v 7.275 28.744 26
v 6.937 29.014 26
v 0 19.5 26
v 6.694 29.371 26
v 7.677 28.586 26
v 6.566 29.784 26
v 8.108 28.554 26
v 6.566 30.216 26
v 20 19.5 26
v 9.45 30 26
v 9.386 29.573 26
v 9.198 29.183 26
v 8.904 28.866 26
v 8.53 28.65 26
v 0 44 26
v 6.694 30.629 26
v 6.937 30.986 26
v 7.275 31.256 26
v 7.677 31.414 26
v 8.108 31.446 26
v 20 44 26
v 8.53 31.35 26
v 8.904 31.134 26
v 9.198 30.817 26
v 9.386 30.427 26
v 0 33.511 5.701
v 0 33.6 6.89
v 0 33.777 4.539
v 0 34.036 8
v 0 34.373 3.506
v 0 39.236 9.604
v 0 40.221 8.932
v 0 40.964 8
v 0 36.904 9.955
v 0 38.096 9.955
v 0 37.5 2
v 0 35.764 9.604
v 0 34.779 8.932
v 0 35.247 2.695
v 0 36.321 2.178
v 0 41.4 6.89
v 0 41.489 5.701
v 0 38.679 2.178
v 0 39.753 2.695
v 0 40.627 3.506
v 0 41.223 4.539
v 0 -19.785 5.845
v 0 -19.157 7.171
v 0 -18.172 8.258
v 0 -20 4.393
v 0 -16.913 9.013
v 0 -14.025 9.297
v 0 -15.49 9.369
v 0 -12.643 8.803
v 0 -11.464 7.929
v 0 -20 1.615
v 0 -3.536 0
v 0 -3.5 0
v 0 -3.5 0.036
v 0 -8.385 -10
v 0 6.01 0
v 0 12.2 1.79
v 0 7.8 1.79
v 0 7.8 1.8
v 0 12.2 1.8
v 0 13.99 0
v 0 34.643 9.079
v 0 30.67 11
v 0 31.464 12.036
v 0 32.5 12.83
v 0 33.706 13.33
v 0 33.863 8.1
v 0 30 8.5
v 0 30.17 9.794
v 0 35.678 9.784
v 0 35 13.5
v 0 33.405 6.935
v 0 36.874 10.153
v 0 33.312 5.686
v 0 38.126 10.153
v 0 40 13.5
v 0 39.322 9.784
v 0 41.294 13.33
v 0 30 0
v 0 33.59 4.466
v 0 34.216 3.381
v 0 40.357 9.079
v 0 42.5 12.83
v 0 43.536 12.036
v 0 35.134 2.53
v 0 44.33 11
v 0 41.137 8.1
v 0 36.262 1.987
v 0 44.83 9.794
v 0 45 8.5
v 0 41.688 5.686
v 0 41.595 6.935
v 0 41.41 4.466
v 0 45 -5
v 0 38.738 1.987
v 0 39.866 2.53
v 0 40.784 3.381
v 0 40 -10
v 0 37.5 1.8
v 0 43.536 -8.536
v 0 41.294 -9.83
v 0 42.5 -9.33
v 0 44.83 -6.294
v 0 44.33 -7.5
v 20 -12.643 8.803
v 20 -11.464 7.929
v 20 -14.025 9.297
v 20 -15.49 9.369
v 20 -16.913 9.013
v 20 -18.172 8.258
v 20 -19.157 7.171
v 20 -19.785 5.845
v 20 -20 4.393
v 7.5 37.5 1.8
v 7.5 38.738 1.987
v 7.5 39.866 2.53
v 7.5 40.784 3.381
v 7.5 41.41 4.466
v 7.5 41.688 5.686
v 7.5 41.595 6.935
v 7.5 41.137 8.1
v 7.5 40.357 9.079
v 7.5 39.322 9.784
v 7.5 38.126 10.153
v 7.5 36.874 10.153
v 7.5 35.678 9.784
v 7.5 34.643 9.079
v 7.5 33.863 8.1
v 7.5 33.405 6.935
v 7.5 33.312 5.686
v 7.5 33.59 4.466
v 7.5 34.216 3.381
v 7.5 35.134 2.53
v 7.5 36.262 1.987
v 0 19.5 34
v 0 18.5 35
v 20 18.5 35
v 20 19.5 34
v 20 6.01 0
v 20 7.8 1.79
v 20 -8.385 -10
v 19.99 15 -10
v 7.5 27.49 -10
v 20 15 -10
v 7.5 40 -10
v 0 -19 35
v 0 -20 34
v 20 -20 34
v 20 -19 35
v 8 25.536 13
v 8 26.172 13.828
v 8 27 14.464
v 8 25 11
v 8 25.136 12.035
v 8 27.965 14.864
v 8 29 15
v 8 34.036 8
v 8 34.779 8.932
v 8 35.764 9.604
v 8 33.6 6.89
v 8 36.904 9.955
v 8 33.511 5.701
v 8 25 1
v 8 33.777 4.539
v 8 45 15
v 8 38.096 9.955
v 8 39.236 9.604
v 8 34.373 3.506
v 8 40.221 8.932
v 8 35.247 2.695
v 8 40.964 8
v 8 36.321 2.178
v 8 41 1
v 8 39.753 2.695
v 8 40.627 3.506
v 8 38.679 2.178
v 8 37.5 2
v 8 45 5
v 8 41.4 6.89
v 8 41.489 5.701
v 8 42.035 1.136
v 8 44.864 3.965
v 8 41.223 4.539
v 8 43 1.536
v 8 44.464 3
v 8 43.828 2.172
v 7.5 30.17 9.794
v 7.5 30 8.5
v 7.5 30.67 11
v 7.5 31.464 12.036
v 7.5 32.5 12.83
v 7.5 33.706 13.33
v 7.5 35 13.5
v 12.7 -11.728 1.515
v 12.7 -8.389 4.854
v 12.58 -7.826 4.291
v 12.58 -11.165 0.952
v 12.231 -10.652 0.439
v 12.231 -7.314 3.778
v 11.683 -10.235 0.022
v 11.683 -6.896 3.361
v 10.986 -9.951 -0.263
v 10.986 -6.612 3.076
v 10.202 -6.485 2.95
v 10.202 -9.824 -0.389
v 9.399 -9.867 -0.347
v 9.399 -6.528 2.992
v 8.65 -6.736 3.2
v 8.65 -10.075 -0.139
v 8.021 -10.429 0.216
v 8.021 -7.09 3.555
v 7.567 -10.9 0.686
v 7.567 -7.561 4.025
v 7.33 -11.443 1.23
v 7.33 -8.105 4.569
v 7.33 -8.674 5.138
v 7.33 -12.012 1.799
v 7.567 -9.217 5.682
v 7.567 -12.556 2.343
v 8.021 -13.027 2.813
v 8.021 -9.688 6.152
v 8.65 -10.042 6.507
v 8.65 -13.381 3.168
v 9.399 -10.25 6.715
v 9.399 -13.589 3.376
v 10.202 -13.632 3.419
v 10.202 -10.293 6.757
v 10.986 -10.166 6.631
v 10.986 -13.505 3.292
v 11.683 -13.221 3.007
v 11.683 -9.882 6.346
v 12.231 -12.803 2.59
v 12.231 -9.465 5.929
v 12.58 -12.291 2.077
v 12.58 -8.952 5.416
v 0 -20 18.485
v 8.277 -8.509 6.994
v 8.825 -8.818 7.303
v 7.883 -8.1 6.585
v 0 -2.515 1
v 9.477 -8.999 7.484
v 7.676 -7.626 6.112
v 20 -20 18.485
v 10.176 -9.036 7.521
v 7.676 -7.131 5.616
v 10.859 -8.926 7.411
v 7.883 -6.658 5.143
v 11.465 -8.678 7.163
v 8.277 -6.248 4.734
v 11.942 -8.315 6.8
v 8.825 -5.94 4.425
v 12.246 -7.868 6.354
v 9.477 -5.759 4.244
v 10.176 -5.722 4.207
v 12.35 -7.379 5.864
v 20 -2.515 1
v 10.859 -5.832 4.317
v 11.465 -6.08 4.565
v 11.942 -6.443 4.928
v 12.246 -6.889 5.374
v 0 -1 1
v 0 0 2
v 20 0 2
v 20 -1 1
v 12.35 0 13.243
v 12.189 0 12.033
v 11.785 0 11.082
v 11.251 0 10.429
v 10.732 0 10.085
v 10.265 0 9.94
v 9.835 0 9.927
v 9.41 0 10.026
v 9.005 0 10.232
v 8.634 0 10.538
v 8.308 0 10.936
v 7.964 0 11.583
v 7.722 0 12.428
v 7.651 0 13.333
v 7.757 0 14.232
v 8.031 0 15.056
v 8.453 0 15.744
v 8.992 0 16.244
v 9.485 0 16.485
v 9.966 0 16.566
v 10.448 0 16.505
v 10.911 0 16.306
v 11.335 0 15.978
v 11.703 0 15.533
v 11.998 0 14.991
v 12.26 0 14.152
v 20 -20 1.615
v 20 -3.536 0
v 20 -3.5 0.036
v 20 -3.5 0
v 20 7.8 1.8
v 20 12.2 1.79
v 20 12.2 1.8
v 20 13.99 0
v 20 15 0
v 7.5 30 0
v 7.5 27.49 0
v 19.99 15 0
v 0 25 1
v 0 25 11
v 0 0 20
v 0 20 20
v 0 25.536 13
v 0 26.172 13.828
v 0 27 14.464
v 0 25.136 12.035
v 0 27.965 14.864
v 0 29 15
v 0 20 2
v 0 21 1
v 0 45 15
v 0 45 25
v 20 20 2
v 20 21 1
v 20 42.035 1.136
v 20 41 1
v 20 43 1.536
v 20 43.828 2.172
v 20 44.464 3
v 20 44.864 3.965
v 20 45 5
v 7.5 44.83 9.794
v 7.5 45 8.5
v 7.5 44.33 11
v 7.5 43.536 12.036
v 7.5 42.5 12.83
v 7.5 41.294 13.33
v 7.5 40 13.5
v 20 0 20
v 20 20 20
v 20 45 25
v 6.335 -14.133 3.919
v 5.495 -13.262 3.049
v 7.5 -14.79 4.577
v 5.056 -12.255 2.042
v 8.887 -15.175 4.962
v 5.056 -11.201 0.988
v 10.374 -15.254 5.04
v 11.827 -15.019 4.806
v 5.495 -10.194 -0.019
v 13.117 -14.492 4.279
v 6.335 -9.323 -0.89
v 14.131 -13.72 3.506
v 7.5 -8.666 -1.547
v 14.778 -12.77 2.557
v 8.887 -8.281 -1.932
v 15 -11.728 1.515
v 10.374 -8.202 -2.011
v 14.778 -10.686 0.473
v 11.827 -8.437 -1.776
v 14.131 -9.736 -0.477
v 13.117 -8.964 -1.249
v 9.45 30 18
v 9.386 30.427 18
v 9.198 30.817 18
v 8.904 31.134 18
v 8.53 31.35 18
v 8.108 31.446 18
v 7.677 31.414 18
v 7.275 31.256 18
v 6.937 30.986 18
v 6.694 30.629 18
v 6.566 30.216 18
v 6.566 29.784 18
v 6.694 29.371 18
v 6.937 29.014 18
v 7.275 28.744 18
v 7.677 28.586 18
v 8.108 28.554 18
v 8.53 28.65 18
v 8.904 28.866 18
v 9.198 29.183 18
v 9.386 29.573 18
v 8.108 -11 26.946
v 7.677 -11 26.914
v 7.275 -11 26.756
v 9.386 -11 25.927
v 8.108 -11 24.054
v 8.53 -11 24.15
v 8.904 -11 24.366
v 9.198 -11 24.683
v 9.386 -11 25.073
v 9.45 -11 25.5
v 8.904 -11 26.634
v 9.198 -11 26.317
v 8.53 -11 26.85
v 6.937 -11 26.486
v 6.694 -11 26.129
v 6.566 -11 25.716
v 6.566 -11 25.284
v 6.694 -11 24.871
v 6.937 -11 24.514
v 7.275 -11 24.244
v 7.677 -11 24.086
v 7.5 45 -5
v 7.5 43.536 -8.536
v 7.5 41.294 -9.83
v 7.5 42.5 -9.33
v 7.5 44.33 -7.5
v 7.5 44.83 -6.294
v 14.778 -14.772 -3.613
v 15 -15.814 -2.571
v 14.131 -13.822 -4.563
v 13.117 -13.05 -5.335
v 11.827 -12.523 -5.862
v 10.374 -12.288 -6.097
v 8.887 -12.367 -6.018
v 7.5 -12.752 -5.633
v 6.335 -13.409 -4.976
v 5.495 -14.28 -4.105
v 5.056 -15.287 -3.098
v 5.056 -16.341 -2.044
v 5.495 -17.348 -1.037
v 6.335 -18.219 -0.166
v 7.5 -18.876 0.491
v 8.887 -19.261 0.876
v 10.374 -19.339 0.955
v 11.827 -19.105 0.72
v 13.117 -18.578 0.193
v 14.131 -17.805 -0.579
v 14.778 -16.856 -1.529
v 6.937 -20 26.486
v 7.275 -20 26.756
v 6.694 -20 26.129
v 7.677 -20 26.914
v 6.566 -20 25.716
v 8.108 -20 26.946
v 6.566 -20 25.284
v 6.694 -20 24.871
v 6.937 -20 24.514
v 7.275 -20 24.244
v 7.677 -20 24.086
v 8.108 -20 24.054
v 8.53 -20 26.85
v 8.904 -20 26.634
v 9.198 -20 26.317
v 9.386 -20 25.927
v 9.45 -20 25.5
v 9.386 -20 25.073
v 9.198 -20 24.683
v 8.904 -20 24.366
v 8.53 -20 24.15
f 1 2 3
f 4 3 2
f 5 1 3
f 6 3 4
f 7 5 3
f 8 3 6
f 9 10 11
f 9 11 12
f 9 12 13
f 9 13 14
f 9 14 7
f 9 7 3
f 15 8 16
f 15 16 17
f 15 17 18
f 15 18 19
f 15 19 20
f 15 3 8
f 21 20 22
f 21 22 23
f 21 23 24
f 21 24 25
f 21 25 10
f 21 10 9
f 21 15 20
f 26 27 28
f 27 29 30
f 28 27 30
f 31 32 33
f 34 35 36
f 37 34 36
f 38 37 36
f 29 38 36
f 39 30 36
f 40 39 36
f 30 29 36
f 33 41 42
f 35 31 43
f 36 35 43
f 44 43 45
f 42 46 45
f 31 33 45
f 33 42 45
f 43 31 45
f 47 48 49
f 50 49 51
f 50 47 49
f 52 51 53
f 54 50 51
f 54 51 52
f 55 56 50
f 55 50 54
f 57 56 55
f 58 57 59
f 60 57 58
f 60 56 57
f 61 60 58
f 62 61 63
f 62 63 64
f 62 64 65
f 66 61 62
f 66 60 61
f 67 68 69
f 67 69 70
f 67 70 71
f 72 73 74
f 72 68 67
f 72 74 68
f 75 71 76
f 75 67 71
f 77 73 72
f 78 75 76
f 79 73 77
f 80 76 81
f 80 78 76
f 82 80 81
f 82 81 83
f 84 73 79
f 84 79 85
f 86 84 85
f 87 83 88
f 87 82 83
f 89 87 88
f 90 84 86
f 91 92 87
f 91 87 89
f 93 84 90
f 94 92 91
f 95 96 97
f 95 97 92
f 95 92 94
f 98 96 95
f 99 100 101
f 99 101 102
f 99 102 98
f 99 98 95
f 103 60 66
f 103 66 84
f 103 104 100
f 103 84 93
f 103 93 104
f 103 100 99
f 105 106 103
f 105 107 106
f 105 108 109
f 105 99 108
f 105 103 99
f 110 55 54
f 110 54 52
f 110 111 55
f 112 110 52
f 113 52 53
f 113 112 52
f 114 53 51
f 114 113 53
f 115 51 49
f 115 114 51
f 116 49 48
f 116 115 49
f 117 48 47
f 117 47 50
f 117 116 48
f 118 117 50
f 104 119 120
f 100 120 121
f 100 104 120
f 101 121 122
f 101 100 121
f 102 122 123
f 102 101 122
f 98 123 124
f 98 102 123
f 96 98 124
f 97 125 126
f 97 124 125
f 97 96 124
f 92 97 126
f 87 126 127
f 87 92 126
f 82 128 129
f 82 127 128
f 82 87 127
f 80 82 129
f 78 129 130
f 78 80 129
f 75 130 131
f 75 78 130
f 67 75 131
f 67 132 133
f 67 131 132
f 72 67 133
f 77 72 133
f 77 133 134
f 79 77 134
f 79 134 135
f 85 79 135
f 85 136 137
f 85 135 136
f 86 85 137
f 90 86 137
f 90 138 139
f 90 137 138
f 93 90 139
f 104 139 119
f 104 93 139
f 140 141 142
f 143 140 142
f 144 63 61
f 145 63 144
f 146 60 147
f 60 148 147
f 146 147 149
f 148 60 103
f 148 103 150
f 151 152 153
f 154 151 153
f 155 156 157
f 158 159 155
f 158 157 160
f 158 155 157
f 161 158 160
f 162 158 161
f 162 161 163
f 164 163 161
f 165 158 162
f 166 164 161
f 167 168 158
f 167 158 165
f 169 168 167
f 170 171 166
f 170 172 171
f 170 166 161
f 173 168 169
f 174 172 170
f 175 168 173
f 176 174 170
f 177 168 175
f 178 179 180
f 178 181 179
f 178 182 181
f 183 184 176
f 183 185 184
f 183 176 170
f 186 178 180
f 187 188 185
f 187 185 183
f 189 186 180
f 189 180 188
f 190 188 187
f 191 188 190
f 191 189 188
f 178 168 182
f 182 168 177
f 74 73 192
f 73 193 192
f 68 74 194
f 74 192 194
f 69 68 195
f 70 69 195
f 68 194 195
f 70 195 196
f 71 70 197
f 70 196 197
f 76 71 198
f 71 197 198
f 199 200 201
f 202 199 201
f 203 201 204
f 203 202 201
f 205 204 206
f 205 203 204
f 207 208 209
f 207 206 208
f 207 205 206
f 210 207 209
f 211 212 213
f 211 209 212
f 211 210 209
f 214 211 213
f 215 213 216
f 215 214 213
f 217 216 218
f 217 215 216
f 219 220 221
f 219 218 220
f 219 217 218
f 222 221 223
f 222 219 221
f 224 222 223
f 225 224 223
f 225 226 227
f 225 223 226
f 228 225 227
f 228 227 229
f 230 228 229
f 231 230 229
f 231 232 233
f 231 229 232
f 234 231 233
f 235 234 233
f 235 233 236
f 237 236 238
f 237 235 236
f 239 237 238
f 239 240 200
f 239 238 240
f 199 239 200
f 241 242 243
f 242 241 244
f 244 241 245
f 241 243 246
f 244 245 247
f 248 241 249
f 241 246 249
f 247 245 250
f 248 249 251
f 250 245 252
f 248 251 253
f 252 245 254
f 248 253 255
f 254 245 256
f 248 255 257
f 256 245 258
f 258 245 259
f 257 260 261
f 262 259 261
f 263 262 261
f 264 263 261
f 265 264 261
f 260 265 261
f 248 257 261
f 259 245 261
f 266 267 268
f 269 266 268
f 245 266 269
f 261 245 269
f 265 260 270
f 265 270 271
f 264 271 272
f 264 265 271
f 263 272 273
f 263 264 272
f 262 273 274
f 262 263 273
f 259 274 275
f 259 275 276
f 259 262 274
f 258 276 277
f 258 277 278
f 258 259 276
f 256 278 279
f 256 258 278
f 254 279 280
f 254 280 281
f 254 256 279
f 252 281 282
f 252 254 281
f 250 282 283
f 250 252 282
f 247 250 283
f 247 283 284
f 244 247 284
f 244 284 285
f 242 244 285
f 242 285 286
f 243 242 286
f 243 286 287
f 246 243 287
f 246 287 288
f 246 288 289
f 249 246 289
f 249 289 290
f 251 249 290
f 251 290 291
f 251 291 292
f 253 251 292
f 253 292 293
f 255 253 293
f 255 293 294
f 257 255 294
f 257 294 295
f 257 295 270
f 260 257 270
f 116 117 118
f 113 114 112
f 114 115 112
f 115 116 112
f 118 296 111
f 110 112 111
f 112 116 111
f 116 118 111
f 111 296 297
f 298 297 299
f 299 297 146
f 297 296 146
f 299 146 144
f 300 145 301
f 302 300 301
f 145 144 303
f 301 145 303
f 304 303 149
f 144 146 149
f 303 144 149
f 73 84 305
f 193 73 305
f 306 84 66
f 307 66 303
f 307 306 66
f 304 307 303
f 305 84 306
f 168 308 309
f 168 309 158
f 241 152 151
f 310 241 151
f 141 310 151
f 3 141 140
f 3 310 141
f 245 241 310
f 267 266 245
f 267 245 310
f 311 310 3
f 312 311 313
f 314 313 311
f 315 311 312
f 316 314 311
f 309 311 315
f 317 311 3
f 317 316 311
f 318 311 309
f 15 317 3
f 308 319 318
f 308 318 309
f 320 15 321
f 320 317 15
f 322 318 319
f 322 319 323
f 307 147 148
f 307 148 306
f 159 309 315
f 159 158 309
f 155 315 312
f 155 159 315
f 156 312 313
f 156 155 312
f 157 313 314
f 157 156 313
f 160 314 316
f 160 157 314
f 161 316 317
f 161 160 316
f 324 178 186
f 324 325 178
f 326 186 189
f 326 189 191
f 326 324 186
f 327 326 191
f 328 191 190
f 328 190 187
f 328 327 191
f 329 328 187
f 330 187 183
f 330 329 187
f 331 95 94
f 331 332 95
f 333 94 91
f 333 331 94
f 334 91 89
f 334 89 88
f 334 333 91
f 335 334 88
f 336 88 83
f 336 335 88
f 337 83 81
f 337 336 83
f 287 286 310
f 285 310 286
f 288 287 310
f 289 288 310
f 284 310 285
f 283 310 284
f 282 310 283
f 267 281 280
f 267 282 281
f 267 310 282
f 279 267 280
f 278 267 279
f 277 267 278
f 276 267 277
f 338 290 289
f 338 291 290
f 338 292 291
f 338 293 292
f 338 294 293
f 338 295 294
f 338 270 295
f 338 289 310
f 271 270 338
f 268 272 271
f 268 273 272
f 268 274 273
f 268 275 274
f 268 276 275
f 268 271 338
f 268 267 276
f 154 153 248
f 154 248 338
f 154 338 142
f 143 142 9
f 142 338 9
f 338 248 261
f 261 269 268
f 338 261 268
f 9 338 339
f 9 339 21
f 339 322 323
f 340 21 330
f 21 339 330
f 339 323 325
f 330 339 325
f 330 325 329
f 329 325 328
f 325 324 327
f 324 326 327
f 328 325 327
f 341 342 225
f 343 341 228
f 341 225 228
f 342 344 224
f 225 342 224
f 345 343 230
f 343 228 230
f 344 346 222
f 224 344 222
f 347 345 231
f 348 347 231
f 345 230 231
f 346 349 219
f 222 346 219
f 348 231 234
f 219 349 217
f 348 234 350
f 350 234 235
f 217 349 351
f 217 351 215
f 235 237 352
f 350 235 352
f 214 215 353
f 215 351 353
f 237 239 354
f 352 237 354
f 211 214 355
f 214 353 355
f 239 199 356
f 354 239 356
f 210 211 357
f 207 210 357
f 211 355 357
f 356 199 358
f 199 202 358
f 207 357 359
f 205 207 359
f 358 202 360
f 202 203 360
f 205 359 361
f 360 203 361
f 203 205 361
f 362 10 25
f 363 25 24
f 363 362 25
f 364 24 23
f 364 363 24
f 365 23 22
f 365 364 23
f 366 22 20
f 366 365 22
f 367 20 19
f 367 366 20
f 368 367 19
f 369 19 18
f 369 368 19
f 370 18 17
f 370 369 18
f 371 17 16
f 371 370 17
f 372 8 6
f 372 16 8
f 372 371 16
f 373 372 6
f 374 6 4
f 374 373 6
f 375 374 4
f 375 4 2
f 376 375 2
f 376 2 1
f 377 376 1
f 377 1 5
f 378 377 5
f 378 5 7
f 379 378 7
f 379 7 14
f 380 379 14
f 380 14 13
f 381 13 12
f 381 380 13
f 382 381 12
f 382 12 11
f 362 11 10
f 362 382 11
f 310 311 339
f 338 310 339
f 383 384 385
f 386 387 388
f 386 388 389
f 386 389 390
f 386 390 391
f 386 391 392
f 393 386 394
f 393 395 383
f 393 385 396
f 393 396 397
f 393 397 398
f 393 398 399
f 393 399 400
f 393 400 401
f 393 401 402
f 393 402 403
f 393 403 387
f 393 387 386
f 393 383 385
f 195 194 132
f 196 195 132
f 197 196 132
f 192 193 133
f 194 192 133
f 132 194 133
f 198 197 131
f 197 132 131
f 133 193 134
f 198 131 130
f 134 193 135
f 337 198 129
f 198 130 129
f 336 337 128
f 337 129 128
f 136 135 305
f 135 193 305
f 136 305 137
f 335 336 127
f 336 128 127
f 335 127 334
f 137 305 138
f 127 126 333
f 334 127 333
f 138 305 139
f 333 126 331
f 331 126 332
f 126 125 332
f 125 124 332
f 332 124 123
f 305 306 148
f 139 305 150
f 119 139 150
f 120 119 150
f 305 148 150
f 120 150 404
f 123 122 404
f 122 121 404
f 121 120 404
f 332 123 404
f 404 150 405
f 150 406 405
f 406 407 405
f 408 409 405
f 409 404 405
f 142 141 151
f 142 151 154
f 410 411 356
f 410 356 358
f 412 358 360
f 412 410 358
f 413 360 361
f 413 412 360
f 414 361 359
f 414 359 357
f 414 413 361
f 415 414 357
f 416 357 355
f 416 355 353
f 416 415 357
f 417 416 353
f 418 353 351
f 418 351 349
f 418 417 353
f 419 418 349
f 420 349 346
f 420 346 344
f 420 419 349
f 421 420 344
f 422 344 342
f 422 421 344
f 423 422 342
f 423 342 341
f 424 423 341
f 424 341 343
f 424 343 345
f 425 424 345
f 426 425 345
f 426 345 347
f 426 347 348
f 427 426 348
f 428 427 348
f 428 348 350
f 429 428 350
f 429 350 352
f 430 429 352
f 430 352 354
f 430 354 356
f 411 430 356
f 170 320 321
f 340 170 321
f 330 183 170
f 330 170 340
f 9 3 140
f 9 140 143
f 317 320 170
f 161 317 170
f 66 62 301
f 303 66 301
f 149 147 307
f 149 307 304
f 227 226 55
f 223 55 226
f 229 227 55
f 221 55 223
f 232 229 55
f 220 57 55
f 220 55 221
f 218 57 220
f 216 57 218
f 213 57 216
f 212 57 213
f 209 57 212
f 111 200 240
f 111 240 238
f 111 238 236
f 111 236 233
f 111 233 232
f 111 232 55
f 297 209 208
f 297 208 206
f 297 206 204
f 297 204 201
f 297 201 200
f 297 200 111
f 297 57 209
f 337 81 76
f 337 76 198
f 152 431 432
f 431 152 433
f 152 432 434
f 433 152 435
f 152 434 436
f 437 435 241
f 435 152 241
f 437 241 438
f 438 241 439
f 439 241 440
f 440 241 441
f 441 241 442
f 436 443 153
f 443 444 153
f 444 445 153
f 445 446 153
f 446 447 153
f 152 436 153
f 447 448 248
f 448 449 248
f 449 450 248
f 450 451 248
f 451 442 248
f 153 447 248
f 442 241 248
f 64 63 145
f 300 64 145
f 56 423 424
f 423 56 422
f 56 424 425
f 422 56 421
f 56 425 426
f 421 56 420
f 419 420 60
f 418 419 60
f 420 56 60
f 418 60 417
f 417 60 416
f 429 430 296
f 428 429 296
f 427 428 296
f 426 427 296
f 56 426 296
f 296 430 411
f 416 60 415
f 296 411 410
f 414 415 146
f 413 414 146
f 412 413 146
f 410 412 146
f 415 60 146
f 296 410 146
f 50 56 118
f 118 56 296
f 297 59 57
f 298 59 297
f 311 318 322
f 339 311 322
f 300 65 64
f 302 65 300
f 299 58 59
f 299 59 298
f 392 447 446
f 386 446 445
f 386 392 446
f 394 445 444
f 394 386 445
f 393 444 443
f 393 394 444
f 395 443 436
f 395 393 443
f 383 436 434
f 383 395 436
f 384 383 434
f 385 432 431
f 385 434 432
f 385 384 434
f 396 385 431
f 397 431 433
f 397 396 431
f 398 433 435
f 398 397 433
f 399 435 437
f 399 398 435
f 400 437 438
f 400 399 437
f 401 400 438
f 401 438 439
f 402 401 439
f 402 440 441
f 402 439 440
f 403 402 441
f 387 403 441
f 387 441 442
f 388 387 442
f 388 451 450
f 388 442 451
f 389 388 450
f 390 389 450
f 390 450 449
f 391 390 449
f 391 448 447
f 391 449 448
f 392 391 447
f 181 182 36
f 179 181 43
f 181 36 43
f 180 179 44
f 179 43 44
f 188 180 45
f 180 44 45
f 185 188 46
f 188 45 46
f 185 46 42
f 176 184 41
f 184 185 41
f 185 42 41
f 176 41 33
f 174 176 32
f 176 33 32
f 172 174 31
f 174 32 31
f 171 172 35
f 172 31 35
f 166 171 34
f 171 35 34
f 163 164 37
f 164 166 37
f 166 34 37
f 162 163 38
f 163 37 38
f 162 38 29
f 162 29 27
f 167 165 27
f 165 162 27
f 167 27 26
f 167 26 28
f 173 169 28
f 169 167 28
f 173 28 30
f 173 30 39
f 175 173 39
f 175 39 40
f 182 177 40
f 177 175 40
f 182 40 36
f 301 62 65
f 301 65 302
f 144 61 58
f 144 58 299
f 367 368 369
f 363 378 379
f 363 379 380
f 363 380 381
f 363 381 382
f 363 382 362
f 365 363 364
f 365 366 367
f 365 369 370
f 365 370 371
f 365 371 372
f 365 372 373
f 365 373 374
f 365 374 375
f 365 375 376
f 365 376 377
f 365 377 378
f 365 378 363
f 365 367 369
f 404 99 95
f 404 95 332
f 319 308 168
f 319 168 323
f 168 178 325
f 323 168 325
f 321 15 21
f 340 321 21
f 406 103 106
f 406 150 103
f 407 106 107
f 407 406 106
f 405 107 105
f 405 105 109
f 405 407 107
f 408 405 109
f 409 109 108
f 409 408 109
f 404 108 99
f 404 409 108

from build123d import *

# Parameters (mm, degrees)
BOX012_W                    = 20
BOX012_H                    = 65
BOX012_DEPTH                = 1
CYLINDER004_R               = 4
CYLINDER004_DEPTH           = 10
CYLINDER002_R               = 1.45
CYLINDER002_DEPTH           = 10
CYLINDER001_R               = 2.35
CYLINDER001_DEPTH           = 15
CYLINDER001_PLACEMENT_ANGLE = 45
CYLINDER_R                  = 1.45
CYLINDER_DEPTH              = 10
BOX004_W                    = 8
BOX004_H                    = 20
BOX004_DEPTH                = 15
BOX002_W                    = 20
BOX002_H                    = 25.5
BOX002_DEPTH                = 9
BOX003_W                    = 20
BOX003_H                    = 25
BOX003_DEPTH                = 50
BOX003_PLACEMENT_ANGLE      = 45
BOX_W                       = 20
BOX_H                       = 20
BOX_DEPTH                   = 20
BOX001_W                    = 20
BOX001_H                    = 65
BOX001_DEPTH                = 35
CHAMFER_SIZE                = 1
FILLET_R                    = 4
BOX013_W                    = 20
BOX013_H                    = 4.4
BOX013_DEPTH                = 1.8
CYLINDER007_R               = 5
CYLINDER007_DEPTH           = 6
CYLINDER007_PLACEMENT_ANGLE = 45
BOX011_W                    = 20
BOX011_H                    = 30
BOX011_DEPTH                = 50
BOX011_PLACEMENT_ANGLE      = 45
CYLINDER006_R               = 2.7
CYLINDER006_DEPTH           = 20
CYLINDER006_PLACEMENT_ANGLE = 45
BOX009_W                    = 20
BOX009_H                    = 10
BOX009_DEPTH                = 10
BOX008_W                    = 20
BOX008_H                    = 30
BOX008_DEPTH                = 50
BOX008_PLACEMENT_ANGLE      = 45
BOX007_W                    = 20
BOX007_H                    = 20
BOX007_DEPTH                = 30
CYLINDER005_R               = 4.2
CYLINDER005_DEPTH           = 10
BOX006_W                    = 7.5
BOX006_H                    = 15
BOX006_DEPTH                = 14
BOX005_W                    = 7.5
BOX005_H                    = 65
BOX005_DEPTH                = 10
BOX010_W                    = 12.5
BOX010_H                    = 35
BOX010_DEPTH                = 10
CHAMFER001_SIZE             = 1.79
CHAMFER002_SIZE             = 12.49
FILLET001_R                 = 5


with BuildPart() as cube008:
    # Box012 → Box012 (new body)
    with BuildSketch(Plane(origin=(0, -20, 0), x_dir=(1, 0, 0), z_dir=(0, 0, 1))):
        with Locations((10, 32.5)):
            Rectangle(BOX012_W, BOX012_H)
    extrude(amount=BOX012_DEPTH)


with BuildPart() as cylinder004:
    # Cylinder004 → Cylinder004 (new body)
    with BuildSketch(Plane(origin=(0, 37.5, 6), x_dir=(0, 0, -1), z_dir=(1, 0, 0))):
        Circle(CYLINDER004_R)
    extrude(amount=CYLINDER004_DEPTH)


with BuildPart() as cylinder002:
    # Cylinder002 → Cylinder002 (new body)
    with BuildSketch(Plane(origin=(8, -11, 25.5), x_dir=(1, 0, 0), z_dir=(0, -1, 0))):
        Circle(CYLINDER002_R)
    extrude(amount=CYLINDER002_DEPTH)


with BuildPart() as cylinder001:
    # Cylinder001 → Cylinder001 (new body)
    with BuildSketch(Plane.XY):
        Circle(CYLINDER001_R)
    extrude(amount=CYLINDER001_DEPTH)


with BuildPart() as cylinder001_1:
    # Cylinder001 placement: moved
    add(cylinder001.part.moved(Location((10, -8.89949, 4.34315))).rotate(Axis((10, -8.89949, 4.34315), (-1, 0, 0)), CYLINDER001_PLACEMENT_ANGLE))


with BuildPart() as fusion_holes:
    # Cylinder → Cylinder (new body)
    with BuildSketch(Plane(origin=(8, 30, 18), x_dir=(1, 0, 0), z_dir=(0, 0, 1))):
        Circle(CYLINDER_R)
    extrude(amount=CYLINDER_DEPTH)

    # Fusion001: union Cylinder002, Cylinder001
    add(cylinder002.part)
    add(cylinder001_1.part)


with BuildPart() as cube003:
    # Box004 → Box004 (new body)
    with BuildSketch(Plane(origin=(0, 25, 0), x_dir=(1, 0, 0), z_dir=(0, 0, 1))):
        with Locations((4, 10)):
            Rectangle(BOX004_W, BOX004_H)
    extrude(amount=BOX004_DEPTH)


with BuildPart() as cube002:
    # Box002 → Box002 (new body)
    with BuildSketch(Plane(origin=(0, 19.5, 26), x_dir=(1, 0, 0), z_dir=(0, 0, 1))):
        with Locations((10, 12.75)):
            Rectangle(BOX002_W, BOX002_H)
    extrude(amount=BOX002_DEPTH)


with BuildPart() as cube_45deg:
    # Box003 → Box003 (new body)
    with BuildSketch(Plane.XY):
        with Locations((10, 12.5)):
            Rectangle(BOX003_W, BOX003_H)
    extrude(amount=BOX003_DEPTH)


with BuildPart() as cube_45deg_1:
    # Box003 placement: moved
    add(cube_45deg.part.moved(Location((0, -18.485281, -18.384776))).rotate(Axis((0, -18.485281, -18.384776), (1, 0, 0)), BOX003_PLACEMENT_ANGLE))


with BuildPart() as fusion:
    # Box → Box (new body)
    with BuildSketch(Plane.XY):
        with Locations((10, 10)):
            Rectangle(BOX_W, BOX_H)
    extrude(amount=BOX_DEPTH)

    # Fusion: union Cube002, cube_45deg
    add(cube002.part)
    add(cube_45deg_1.part)


with BuildPart() as top_part:
    # Box001 → Box001 (new body)
    with BuildSketch(Plane(origin=(0, -20, 0), x_dir=(1, 0, 0), z_dir=(0, 0, 1))):
        with Locations((10, 32.5)):
            Rectangle(BOX001_W, BOX001_H)
    extrude(amount=BOX001_DEPTH)

    # Cut: cut Fusion
    add(fusion.part, mode=Mode.SUBTRACT)

    # Cut001: cut Cube003
    add(cube003.part, mode=Mode.SUBTRACT)

    # Cut002: cut fusion holes
    add(fusion_holes.part, mode=Mode.SUBTRACT)

    # Fusion002: union Cylinder004
    add(cylinder004.part)

    # Cut008: cut Cube008
    add(cube008.part, mode=Mode.SUBTRACT)

    # Chamfer
    chamfer_edges = [top_part.edges().sort_by_distance(p)[0] for p in [
        (10, 45, 26),
        (10, 20, 1),
        (10, -20, 35),
        (10, 19.5, 35),
        (10, 0, 1),
    ]]
    chamfer(chamfer_edges, length=CHAMFER_SIZE)

    # Fillet
    fillet_edges = [top_part.edges().sort_by_distance(p)[0] for p in [
        (14, 45, 1),
        (4, 25, 15),
    ]]
    fillet(fillet_edges, radius=FILLET_R)


with BuildPart() as cube009:
    # Box013 → Box013 (new body)
    with BuildSketch(Plane(origin=(0, 7.8, 0), x_dir=(1, 0, 0), z_dir=(0, 0, 1))):
        with Locations((10, 2.2)):
            Rectangle(BOX013_W, BOX013_H)
    extrude(amount=BOX013_DEPTH)


with BuildPart() as cylinder007:
    # Cylinder007 → Cylinder007 (new body)
    with BuildSketch(Plane.XY):
        Circle(CYLINDER007_R)
    extrude(amount=CYLINDER007_DEPTH)


with BuildPart() as cylinder007_1:
    # Cylinder007 placement: moved
    add(cylinder007.part.moved(Location((10, -15.9706, -2.72792))).rotate(Axis((10, -15.9706, -2.72792), (-1, 0, 0)), CYLINDER007_PLACEMENT_ANGLE))


with BuildPart() as box011:
    # Box011 → Box011 (new body)
    with BuildSketch(Plane.XY):
        with Locations((10, 15)):
            Rectangle(BOX011_W, BOX011_H)
    extrude(amount=BOX011_DEPTH)


with BuildPart() as box011_1:
    # Box011 placement: moved
    add(box011.part.moved(Location((0, -24.041631, -36.769553))).rotate(Axis((0, -24.041631, -36.769553), (1, 0, 0)), BOX011_PLACEMENT_ANGLE))


with BuildPart() as cylinder006:
    # Cylinder006 → Cylinder006 (new body)
    with BuildSketch(Plane.XY):
        Circle(CYLINDER006_R)
    extrude(amount=CYLINDER006_DEPTH)


with BuildPart() as cylinder006_1:
    # Cylinder006 placement: moved
    add(cylinder006.part.moved(Location((10, -22.3345, -9.09188))).rotate(Axis((10, -22.3345, -9.09188), (-1, 0, 0)), CYLINDER006_PLACEMENT_ANGLE))


with BuildPart() as box009:
    # Box009 → Box009 (new body)
    with BuildSketch(Plane(origin=(0, -3.5, -0.5), x_dir=(1, 0, 0), z_dir=(0, 0, 1))):
        with Locations((10, 5)):
            Rectangle(BOX009_W, BOX009_H)
    extrude(amount=BOX009_DEPTH)


with BuildPart() as cube007:
    # Box008 → Box008 (new body)
    with BuildSketch(Plane.XY):
        with Locations((10, 15)):
            Rectangle(BOX008_W, BOX008_H)
    extrude(amount=BOX008_DEPTH)


with BuildPart() as cube007_1:
    # Box008 placement: moved
    add(cube007.part.moved(Location((0, -3.535534, 0))).rotate(Axis((0, -3.535534, 0), (1, 0, 0)), BOX008_PLACEMENT_ANGLE))


with BuildPart() as cut005:
    # Box007 → Box007 (new body)
    with BuildSketch(Plane(origin=(0, -20, -0.5), x_dir=(1, 0, 0), z_dir=(0, 0, 1))):
        with Locations((10, 10)):
            Rectangle(BOX007_W, BOX007_H)
    extrude(amount=BOX007_DEPTH)

    # Cut004: cut Cube007
    add(cube007_1.part, mode=Mode.SUBTRACT)

    # Cut005: cut Box009
    add(box009.part, mode=Mode.SUBTRACT)


with BuildPart() as cylinder005:
    # Cylinder005 → Cylinder005 (new body)
    with BuildSketch(Plane(origin=(0, 37.5, 6), x_dir=(0, 0, -1), z_dir=(1, 0, 0))):
        Circle(CYLINDER005_R)
    extrude(amount=CYLINDER005_DEPTH)


with BuildPart() as cube005:
    # Box006 → Box006 (new body)
    with BuildSketch(Plane(origin=(0, 30, -0.5), x_dir=(1, 0, 0), z_dir=(0, 0, 1))):
        with Locations((3.75, 7.5)):
            Rectangle(BOX006_W, BOX006_H)
    extrude(amount=BOX006_DEPTH)


with BuildPart() as cut003:
    # Box005 → Box005 (new body)
    with BuildSketch(Plane(origin=(0, -20, -10), x_dir=(1, 0, 0), z_dir=(0, 0, 1))):
        with Locations((3.75, 32.5)):
            Rectangle(BOX005_W, BOX005_H)
    extrude(amount=BOX005_DEPTH)

    # Fusion003: union Cube005+
    add(cube005.part)

    # Cut003: cut Cylinder005-
    add(cylinder005.part, mode=Mode.SUBTRACT)


with BuildPart() as bot_part:
    # Box010 → Box010 (new body)
    with BuildSketch(Plane(origin=(7.5, -20, -10), x_dir=(1, 0, 0), z_dir=(0, 0, 1))):
        with Locations((6.25, 17.5)):
            Rectangle(BOX010_W, BOX010_H)
    extrude(amount=BOX010_DEPTH)

    # Fusion004: union Cut005, Cut003
    add(cut005.part)
    add(cut003.part)

    # Cut006: cut Cylinder006-
    add(cylinder006_1.part, mode=Mode.SUBTRACT)

    # Cut007: cut Box011
    add(box011_1.part, mode=Mode.SUBTRACT)

    # Cut009: cut Cylinder007
    add(cylinder007_1.part, mode=Mode.SUBTRACT)

    # Fusion005: union Cube009
    add(cube009.part)

    # Chamfer001
    chamfer001_edges = [bot_part.edges().sort_by_distance(p)[0] for p in [
        (3.75, 7.8, 0),
        (13.75, 7.8, 0),
        (3.75, 12.2, 0),
        (13.75, 12.2, 0),
    ]]
    chamfer(chamfer001_edges, length=CHAMFER001_SIZE)

    # Chamfer002
    chamfer002_edges = [bot_part.edges().sort_by_distance(p)[0] for p in [
        (7.5, 15, -5),
    ]]
    chamfer(chamfer002_edges, length=CHAMFER002_SIZE)

    # Fillet001
    fillet001_edges = [bot_part.edges().sort_by_distance(p)[0] for p in [
        (3.75, 30, 13.5),
        (3.75, 45, -10),
        (3.75, 45, 13.5),
        (10, -20, 16.464466),
    ]]
    fillet(fillet001_edges, radius=FILLET001_R)


solid = Compound([top_part.part, bot_part.part])
